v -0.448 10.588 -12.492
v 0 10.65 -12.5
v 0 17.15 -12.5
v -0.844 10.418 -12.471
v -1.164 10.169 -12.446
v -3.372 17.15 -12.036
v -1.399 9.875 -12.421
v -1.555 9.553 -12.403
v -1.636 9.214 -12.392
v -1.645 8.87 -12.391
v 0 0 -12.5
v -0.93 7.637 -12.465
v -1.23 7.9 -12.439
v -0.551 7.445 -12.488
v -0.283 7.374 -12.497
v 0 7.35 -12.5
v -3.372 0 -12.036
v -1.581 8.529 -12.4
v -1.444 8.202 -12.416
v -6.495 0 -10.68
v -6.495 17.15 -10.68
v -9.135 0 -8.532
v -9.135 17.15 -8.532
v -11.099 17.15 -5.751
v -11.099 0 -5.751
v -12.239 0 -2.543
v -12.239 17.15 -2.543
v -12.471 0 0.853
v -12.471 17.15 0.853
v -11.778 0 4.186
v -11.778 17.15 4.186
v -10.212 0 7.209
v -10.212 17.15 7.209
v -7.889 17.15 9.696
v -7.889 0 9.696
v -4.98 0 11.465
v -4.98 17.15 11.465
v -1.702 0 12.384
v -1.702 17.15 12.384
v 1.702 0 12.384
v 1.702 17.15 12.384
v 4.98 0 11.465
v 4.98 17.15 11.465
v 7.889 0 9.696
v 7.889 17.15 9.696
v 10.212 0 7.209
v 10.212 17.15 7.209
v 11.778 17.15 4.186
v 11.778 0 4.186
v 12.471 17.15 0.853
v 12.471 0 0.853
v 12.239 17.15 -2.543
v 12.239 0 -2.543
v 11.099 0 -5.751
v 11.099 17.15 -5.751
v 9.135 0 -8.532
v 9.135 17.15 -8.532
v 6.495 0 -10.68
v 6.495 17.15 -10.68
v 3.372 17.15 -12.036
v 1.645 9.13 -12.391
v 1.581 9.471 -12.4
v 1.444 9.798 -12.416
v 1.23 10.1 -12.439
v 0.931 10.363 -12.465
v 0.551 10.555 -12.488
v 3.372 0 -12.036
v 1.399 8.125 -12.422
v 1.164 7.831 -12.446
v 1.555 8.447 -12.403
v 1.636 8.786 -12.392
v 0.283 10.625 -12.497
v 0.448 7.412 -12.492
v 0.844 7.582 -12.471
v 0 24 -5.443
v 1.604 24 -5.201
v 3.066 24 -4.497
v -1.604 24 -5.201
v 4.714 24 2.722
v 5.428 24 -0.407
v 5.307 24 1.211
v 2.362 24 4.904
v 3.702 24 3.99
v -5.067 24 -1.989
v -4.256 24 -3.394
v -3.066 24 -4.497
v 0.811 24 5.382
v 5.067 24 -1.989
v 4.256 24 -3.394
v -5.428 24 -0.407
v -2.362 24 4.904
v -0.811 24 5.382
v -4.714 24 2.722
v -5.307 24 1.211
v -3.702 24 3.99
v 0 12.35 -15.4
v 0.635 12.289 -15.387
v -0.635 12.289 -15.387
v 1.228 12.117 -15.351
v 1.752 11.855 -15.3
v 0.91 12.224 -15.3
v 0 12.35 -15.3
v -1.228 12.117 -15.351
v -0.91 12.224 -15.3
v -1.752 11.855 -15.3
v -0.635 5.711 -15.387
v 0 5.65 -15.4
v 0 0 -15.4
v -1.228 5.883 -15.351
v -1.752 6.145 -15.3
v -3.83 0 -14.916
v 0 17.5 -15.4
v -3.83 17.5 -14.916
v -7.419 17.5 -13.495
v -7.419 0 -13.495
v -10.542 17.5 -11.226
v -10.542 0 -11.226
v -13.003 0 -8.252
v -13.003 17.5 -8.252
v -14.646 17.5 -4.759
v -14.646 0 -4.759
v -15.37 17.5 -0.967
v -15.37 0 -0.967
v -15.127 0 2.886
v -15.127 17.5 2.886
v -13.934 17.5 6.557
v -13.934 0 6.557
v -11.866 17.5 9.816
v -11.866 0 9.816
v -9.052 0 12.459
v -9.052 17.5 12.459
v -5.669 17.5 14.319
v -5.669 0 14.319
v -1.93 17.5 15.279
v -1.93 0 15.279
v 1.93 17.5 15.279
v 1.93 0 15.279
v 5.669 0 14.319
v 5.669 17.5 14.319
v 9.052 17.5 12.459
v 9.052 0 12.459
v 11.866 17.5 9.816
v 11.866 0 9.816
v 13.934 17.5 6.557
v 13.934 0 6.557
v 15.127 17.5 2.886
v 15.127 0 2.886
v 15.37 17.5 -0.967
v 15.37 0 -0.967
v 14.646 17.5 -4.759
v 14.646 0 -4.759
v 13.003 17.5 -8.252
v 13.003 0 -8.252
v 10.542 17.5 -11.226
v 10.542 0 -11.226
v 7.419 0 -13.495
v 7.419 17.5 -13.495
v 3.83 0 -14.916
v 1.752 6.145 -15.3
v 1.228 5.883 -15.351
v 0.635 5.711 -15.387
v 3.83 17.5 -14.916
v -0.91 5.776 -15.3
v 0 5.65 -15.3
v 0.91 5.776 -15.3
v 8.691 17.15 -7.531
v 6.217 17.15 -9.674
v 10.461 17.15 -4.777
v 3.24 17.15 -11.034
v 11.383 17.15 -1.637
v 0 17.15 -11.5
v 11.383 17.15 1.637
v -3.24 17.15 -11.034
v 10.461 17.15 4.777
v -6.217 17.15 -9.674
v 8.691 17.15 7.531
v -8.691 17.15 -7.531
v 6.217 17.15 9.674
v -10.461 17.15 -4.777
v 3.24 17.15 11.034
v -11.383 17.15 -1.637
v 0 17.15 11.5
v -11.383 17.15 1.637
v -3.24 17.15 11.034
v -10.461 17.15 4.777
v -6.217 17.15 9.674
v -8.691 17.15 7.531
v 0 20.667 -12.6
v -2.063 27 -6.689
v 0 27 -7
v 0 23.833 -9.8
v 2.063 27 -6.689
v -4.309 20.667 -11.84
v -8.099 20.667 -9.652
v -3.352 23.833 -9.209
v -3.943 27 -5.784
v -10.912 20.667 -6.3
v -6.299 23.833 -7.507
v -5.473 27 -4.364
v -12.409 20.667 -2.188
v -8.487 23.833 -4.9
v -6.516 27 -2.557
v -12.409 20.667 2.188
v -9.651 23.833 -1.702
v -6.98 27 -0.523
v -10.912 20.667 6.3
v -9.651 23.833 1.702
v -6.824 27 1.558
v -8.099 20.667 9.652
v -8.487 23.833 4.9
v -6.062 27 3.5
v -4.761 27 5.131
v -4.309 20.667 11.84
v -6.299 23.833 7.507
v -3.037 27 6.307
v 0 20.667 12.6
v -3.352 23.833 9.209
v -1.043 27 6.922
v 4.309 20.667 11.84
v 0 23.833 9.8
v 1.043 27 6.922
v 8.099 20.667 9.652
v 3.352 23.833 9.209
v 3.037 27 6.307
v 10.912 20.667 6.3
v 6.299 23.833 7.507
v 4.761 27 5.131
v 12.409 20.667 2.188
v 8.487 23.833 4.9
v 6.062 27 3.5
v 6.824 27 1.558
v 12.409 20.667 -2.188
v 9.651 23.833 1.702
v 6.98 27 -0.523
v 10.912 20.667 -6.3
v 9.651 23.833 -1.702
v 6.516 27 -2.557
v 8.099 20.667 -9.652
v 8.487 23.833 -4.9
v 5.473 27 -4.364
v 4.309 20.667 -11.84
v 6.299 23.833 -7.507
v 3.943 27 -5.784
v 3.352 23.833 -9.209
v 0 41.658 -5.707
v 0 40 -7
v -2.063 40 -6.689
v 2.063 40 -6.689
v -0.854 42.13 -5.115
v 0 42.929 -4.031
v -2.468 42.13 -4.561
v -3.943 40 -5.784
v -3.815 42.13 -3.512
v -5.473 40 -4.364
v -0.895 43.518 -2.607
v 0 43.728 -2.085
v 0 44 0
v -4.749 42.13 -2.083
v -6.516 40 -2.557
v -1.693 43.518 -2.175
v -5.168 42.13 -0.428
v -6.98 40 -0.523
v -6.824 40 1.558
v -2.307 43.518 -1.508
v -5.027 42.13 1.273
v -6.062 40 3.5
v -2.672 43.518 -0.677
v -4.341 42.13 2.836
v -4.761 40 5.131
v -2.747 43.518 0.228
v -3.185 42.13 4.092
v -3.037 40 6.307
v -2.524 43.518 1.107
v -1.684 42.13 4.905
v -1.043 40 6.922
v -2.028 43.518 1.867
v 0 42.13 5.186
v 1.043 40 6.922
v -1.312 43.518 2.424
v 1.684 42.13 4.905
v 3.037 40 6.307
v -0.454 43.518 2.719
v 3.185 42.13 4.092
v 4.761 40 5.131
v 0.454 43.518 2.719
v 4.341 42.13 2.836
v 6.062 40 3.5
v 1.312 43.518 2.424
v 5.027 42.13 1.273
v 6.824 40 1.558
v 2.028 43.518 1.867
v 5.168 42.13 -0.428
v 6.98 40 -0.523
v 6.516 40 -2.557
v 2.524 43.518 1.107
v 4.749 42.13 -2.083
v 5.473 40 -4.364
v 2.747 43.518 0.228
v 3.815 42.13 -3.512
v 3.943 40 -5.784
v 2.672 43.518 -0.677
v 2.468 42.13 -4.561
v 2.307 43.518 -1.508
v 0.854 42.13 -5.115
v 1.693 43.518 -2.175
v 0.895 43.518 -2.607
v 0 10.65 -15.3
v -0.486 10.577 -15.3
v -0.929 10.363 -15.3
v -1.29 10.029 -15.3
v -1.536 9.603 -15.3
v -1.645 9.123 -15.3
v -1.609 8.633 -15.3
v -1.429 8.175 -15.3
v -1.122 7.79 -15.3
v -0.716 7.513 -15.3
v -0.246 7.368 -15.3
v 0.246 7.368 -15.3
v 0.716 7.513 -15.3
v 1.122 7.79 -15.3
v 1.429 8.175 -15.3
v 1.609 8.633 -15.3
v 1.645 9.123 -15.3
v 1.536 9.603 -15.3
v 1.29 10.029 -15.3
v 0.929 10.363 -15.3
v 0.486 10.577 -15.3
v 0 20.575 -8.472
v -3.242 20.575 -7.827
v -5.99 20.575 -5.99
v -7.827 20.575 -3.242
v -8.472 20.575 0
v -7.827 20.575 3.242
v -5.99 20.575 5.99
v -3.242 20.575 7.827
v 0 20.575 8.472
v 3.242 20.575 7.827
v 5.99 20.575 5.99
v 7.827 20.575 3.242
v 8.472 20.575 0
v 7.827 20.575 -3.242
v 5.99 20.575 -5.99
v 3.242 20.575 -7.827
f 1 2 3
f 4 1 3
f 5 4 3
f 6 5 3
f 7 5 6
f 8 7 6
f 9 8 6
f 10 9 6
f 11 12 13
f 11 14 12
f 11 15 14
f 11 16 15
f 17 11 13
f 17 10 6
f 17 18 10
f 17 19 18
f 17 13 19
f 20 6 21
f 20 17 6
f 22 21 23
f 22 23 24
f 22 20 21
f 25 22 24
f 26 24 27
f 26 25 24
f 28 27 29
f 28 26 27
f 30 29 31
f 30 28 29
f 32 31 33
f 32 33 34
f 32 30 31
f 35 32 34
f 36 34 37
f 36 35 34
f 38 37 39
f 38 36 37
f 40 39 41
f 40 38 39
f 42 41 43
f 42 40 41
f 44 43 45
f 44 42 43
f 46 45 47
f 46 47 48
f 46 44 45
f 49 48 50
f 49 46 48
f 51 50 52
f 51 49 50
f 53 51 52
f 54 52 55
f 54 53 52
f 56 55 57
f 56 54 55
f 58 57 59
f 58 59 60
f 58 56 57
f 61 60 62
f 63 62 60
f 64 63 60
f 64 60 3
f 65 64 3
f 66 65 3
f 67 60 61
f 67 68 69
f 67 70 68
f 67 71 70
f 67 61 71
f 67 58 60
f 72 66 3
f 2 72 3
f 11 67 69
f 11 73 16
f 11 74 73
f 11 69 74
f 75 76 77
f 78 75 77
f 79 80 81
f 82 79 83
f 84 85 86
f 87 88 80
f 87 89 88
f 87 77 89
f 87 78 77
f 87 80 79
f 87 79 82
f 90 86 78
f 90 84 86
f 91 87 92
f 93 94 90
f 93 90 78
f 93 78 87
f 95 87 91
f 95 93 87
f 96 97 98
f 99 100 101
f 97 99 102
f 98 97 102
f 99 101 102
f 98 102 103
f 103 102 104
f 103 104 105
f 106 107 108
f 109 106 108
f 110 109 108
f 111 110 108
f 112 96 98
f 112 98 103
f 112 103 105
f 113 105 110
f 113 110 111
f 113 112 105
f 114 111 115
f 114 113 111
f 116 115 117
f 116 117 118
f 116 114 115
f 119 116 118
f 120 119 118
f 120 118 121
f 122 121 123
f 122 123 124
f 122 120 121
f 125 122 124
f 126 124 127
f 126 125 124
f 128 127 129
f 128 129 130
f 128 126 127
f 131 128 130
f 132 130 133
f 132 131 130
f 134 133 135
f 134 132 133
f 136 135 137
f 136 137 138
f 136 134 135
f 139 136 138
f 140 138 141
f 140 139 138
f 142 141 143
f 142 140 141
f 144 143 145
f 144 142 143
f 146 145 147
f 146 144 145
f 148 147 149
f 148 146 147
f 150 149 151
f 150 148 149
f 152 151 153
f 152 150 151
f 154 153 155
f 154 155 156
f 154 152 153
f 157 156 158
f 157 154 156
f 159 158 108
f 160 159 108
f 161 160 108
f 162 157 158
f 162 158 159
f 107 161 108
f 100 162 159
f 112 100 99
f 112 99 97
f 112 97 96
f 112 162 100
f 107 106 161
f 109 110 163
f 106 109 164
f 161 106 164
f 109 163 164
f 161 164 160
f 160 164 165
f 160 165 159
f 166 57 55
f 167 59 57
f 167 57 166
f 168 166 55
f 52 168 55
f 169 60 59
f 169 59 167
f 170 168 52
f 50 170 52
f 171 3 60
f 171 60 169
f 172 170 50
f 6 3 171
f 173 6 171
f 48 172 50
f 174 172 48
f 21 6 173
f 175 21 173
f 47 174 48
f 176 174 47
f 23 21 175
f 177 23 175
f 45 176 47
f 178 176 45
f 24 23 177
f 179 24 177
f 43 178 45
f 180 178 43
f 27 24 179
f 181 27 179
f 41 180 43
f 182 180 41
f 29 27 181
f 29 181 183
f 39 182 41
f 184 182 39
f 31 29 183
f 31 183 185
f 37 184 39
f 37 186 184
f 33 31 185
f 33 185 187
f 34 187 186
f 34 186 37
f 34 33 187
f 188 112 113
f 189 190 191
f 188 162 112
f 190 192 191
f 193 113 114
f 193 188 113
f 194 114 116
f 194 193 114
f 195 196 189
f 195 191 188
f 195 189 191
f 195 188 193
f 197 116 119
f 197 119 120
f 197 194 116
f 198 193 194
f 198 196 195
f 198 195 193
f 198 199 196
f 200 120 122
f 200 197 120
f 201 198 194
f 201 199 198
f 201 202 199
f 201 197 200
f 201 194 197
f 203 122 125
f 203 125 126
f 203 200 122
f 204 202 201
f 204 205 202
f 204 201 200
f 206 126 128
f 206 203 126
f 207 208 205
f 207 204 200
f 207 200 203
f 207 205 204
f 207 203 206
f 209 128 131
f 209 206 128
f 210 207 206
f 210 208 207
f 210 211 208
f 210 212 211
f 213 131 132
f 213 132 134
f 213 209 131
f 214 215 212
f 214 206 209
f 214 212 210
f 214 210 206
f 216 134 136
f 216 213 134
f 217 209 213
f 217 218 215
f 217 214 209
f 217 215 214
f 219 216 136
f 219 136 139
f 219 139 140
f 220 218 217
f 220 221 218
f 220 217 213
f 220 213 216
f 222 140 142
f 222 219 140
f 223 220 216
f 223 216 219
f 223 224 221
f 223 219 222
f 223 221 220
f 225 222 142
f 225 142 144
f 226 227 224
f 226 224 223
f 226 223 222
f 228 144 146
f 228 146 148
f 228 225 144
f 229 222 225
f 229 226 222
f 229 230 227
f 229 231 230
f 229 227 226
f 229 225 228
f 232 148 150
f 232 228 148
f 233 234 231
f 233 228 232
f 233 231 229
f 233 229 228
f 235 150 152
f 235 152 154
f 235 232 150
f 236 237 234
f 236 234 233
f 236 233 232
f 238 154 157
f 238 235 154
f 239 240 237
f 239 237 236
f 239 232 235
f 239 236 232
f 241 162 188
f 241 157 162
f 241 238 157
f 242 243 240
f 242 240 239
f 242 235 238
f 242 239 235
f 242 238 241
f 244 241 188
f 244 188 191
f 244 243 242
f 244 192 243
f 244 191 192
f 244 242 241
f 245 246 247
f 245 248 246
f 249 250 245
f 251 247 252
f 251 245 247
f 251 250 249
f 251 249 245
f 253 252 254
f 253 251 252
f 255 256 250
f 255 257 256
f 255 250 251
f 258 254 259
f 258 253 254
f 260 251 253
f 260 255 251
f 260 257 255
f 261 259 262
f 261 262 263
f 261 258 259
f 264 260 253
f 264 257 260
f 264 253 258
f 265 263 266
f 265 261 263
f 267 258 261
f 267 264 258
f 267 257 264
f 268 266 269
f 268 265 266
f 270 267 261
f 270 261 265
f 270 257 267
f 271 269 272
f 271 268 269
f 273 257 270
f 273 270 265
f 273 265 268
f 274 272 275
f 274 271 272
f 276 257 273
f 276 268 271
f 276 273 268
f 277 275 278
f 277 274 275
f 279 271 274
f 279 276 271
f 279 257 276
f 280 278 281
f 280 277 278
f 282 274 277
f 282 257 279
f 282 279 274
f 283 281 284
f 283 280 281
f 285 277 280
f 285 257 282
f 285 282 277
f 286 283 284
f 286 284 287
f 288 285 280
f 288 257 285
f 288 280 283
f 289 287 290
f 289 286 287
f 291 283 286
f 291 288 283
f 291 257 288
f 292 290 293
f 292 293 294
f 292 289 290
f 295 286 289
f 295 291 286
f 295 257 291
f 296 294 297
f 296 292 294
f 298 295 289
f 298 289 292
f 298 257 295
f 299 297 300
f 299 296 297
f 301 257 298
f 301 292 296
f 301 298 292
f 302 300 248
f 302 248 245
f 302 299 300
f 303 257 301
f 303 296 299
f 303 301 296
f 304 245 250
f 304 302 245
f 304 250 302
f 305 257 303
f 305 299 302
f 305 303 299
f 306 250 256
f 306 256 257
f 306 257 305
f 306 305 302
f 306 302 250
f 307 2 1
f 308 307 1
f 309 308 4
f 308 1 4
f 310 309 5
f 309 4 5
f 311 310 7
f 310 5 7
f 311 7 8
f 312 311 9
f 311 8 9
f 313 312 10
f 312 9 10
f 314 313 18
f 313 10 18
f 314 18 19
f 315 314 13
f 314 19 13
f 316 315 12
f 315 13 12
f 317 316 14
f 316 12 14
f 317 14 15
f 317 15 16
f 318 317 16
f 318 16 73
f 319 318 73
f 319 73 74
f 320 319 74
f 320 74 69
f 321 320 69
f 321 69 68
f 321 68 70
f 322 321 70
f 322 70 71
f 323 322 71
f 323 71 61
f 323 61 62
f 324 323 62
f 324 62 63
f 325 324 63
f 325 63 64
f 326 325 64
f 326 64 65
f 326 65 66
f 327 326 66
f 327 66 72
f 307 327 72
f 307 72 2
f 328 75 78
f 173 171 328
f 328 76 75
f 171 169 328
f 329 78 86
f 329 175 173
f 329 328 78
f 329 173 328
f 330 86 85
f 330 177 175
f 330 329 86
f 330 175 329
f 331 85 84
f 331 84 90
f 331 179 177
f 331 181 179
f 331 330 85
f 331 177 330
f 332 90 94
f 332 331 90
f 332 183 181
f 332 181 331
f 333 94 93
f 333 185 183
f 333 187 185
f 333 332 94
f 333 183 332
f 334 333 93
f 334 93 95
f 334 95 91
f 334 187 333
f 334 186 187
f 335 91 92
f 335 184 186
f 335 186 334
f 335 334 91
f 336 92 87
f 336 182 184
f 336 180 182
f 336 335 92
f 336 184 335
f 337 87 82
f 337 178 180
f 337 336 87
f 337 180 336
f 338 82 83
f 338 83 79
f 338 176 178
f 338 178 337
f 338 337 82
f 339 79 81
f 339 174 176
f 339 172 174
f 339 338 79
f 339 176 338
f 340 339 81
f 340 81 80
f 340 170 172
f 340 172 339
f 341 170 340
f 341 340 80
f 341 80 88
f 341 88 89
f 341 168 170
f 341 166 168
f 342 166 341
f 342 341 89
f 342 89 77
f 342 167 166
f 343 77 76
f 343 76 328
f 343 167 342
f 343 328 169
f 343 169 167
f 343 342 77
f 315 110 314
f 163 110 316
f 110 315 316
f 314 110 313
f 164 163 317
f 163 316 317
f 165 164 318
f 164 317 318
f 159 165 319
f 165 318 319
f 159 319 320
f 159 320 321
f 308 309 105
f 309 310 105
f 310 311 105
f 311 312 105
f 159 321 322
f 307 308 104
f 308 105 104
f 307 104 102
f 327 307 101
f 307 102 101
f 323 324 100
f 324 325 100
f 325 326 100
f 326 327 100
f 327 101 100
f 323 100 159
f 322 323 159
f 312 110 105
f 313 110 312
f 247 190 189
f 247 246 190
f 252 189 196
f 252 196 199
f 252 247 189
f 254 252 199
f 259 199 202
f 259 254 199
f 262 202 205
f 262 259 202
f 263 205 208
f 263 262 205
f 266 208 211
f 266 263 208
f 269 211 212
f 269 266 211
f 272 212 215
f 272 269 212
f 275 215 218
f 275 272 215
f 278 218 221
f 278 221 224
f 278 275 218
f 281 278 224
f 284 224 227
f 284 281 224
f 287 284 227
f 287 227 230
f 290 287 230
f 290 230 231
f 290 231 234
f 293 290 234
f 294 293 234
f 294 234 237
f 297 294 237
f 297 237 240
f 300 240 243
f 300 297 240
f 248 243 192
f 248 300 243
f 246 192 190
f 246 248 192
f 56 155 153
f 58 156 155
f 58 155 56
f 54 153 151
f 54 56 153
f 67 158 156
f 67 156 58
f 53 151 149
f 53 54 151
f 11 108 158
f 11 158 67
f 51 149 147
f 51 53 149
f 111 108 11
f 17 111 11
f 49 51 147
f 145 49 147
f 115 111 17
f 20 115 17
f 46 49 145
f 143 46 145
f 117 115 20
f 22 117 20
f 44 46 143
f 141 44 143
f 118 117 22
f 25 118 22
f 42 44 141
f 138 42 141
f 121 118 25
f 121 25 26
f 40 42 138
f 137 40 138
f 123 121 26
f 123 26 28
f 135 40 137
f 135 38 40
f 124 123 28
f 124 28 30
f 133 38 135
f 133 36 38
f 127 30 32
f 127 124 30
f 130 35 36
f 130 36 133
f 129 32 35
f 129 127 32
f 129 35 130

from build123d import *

# Parameters (mm, degrees)
ESQUISSE2_R             = 1.65
ENL_V_MAT_EXTRU_1_DEPTH = 50.09500993
ESQUISSE3_R             = 3.35
ENL_V_MAT_EXTRU_2_DEPTH = 56.81800793


with BuildPart() as part:
    # Esquisse1 → Révolution1 (revolve)
    with BuildSketch(Plane.XY, mode=Mode.PRIVATE) as r_volution1_sk:
        with BuildLine():
            Line((12.5, 0), (15.4, 0))
            Line((15.4, 0), (15.4, 17.5))
            Line((15.4, 17.5), (7, 27))
            Line((7, 27), (7, 40))
            ThreePointArc((7, 40), (4.031128874, 42.92947553), (0, 44))
            Line((0, 44), (0, 24))
            Line((0, 24), (5.443157895, 24))
            Line((5.443157895, 24), (11.5, 17.15))
            Line((11.5, 17.15), (12.5, 17.15))
            Line((12.5, 17.15), (12.5, 0))
        make_face()
    revolve(r_volution1_sk.sketch.rotate(Axis((0, 0, 0), (0, 1, 0)), 90), axis=Axis((0, 0, 0), (0, 1, 0)))

    # Esquisse2 → Enlèv. mat.-Extru.1 (cut, through all)
    with BuildSketch(Plane.XY):
        with Locations(Location((0, 9, 0), (0, 0, 90))):
            Circle(ESQUISSE2_R)
    extrude(amount=-ENL_V_MAT_EXTRU_1_DEPTH, mode=Mode.SUBTRACT)

    # Esquisse3 → Enlèv. mat.-Extru.2 (cut, through all)
    with BuildSketch(Plane.XY.offset(-15.3)):
        with Locations((0, 9)):
            Circle(ESQUISSE3_R)
    extrude(amount=-ENL_V_MAT_EXTRU_2_DEPTH, mode=Mode.SUBTRACT)


solid = part.part
